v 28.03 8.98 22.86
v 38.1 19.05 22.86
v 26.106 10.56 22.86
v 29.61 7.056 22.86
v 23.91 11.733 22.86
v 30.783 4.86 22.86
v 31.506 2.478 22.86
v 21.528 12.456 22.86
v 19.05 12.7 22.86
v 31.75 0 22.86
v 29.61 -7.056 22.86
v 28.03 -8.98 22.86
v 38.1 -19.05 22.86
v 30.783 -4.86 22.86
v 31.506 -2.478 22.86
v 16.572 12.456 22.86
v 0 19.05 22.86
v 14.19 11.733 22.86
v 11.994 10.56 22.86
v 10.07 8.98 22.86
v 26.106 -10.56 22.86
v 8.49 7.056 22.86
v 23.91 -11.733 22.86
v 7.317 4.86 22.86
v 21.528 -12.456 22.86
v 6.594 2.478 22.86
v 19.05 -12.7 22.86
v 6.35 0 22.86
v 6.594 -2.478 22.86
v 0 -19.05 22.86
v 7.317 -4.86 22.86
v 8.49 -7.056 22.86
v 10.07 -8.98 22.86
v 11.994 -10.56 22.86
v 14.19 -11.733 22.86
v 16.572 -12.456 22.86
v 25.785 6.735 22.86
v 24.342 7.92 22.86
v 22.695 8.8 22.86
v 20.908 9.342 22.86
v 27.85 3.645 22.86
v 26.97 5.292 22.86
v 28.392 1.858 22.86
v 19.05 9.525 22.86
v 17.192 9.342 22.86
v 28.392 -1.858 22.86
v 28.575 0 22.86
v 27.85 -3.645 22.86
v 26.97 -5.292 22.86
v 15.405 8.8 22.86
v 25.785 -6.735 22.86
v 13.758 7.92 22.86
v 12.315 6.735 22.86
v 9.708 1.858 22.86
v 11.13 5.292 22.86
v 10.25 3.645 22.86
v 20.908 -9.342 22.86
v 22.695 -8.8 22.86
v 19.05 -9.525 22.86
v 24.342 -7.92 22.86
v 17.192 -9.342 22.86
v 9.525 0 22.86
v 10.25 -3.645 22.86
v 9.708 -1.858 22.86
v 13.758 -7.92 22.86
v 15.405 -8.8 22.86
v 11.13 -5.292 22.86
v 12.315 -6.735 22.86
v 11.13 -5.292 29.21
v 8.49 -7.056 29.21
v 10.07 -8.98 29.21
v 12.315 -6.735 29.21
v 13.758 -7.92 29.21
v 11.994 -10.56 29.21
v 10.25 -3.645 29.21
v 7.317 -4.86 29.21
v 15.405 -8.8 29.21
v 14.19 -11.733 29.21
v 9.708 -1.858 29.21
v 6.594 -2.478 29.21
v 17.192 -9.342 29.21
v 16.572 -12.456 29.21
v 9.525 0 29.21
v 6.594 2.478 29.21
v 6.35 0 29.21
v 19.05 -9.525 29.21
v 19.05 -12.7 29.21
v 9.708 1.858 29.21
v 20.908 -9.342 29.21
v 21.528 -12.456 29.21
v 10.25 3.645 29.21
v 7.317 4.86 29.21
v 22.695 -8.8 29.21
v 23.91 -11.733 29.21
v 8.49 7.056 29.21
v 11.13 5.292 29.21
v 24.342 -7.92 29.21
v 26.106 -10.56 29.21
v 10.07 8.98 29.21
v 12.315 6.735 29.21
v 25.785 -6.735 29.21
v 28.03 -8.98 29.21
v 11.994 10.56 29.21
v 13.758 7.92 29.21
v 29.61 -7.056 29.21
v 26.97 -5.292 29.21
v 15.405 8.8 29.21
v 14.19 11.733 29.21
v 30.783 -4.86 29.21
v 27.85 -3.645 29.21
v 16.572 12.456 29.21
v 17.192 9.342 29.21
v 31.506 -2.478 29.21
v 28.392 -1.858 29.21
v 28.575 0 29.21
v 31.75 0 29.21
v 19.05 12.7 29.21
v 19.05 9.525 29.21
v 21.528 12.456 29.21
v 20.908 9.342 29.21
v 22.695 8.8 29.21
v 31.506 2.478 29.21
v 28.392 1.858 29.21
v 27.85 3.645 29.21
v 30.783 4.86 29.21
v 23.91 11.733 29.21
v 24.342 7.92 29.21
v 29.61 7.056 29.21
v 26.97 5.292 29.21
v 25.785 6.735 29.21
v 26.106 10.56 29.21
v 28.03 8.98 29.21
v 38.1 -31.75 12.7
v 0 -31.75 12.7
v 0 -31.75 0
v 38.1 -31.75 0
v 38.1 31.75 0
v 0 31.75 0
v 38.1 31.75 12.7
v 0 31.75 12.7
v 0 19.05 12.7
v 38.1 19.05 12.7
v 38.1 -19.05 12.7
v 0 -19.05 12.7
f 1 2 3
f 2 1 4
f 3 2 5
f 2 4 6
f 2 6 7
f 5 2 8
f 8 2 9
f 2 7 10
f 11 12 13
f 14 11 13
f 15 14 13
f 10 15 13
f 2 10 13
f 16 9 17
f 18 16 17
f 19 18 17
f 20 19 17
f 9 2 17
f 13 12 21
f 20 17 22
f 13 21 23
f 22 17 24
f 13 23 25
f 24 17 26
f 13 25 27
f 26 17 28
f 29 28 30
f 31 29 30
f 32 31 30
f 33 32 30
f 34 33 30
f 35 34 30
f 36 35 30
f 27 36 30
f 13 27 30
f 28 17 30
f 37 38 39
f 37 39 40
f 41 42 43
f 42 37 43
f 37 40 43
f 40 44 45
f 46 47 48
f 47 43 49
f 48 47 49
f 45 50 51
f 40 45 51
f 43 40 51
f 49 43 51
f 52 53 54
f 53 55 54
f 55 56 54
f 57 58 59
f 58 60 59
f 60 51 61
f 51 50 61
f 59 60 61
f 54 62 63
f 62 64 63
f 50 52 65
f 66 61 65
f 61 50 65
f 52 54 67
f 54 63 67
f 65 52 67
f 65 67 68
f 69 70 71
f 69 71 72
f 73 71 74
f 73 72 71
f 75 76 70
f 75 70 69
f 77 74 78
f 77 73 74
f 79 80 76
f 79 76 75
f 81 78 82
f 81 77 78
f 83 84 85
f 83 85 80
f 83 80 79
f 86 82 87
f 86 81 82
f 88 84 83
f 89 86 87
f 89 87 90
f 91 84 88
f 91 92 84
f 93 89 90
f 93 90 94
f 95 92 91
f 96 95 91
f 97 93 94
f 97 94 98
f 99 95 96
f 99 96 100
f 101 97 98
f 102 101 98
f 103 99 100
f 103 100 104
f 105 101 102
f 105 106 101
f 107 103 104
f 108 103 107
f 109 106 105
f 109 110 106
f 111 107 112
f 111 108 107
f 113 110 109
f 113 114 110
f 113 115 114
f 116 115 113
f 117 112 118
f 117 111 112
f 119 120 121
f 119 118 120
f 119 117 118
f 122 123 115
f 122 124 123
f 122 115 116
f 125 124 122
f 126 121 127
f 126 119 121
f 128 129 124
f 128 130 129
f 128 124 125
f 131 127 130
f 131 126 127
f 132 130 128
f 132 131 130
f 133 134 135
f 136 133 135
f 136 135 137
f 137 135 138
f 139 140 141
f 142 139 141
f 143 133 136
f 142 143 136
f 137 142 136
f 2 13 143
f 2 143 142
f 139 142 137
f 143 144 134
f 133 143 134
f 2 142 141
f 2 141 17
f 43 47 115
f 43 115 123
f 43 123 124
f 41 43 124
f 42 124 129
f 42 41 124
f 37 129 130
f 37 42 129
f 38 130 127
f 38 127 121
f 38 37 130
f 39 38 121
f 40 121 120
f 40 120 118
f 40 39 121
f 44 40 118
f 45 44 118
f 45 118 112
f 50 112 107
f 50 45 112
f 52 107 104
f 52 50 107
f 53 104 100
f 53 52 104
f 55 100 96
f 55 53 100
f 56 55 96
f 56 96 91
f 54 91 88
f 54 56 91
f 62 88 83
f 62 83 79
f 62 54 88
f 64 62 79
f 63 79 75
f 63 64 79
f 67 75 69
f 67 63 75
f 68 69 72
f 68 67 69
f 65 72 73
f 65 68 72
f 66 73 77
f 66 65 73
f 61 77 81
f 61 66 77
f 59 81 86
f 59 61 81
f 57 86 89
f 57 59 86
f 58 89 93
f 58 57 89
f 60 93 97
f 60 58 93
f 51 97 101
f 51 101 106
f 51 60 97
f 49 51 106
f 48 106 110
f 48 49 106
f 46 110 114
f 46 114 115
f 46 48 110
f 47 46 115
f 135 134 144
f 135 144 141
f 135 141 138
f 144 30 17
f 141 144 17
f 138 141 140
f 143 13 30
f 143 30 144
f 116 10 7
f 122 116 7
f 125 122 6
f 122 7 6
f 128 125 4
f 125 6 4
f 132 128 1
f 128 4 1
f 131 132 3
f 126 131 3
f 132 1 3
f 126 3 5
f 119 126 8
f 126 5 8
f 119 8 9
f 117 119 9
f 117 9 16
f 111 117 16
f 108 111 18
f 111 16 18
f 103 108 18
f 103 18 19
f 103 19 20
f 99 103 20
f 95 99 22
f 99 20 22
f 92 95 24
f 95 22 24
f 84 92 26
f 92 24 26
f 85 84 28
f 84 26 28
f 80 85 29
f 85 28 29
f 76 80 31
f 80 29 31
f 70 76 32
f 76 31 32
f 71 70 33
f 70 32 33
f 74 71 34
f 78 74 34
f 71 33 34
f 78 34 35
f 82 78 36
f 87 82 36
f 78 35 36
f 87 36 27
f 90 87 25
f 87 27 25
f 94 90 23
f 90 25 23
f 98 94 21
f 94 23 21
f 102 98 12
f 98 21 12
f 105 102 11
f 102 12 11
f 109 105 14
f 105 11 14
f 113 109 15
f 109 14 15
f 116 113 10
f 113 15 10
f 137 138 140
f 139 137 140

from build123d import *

# Parameters (mm, degrees)
F1_DEPTH = 38.1
F2_R     = 12.7
F2_R_2   = 9.525
F3_DEPTH = 6.35


with BuildPart() as f1:
    # F0 (on Right) → F1 (new body)
    with BuildSketch(Plane.YZ):
        Polygon((-31.75, 0), (0, 0), (31.75, 0), (31.75, 12.7), (19.05, 12.7), (19.05, 22.86), (-19.05, 22.86), (-19.05, 12.7), (-31.75, 12.7), align=None)
    extrude(amount=F1_DEPTH)

    # F2 (on face) → F3 (join)
    with BuildSketch(Plane.XY.offset(22.86)):
        with Locations((19.05, 0)):
            Circle(F2_R)
        with Locations((19.05, 0)):
            Circle(F2_R_2, mode=Mode.SUBTRACT)
    extrude(amount=F3_DEPTH)


solid = f1.part
